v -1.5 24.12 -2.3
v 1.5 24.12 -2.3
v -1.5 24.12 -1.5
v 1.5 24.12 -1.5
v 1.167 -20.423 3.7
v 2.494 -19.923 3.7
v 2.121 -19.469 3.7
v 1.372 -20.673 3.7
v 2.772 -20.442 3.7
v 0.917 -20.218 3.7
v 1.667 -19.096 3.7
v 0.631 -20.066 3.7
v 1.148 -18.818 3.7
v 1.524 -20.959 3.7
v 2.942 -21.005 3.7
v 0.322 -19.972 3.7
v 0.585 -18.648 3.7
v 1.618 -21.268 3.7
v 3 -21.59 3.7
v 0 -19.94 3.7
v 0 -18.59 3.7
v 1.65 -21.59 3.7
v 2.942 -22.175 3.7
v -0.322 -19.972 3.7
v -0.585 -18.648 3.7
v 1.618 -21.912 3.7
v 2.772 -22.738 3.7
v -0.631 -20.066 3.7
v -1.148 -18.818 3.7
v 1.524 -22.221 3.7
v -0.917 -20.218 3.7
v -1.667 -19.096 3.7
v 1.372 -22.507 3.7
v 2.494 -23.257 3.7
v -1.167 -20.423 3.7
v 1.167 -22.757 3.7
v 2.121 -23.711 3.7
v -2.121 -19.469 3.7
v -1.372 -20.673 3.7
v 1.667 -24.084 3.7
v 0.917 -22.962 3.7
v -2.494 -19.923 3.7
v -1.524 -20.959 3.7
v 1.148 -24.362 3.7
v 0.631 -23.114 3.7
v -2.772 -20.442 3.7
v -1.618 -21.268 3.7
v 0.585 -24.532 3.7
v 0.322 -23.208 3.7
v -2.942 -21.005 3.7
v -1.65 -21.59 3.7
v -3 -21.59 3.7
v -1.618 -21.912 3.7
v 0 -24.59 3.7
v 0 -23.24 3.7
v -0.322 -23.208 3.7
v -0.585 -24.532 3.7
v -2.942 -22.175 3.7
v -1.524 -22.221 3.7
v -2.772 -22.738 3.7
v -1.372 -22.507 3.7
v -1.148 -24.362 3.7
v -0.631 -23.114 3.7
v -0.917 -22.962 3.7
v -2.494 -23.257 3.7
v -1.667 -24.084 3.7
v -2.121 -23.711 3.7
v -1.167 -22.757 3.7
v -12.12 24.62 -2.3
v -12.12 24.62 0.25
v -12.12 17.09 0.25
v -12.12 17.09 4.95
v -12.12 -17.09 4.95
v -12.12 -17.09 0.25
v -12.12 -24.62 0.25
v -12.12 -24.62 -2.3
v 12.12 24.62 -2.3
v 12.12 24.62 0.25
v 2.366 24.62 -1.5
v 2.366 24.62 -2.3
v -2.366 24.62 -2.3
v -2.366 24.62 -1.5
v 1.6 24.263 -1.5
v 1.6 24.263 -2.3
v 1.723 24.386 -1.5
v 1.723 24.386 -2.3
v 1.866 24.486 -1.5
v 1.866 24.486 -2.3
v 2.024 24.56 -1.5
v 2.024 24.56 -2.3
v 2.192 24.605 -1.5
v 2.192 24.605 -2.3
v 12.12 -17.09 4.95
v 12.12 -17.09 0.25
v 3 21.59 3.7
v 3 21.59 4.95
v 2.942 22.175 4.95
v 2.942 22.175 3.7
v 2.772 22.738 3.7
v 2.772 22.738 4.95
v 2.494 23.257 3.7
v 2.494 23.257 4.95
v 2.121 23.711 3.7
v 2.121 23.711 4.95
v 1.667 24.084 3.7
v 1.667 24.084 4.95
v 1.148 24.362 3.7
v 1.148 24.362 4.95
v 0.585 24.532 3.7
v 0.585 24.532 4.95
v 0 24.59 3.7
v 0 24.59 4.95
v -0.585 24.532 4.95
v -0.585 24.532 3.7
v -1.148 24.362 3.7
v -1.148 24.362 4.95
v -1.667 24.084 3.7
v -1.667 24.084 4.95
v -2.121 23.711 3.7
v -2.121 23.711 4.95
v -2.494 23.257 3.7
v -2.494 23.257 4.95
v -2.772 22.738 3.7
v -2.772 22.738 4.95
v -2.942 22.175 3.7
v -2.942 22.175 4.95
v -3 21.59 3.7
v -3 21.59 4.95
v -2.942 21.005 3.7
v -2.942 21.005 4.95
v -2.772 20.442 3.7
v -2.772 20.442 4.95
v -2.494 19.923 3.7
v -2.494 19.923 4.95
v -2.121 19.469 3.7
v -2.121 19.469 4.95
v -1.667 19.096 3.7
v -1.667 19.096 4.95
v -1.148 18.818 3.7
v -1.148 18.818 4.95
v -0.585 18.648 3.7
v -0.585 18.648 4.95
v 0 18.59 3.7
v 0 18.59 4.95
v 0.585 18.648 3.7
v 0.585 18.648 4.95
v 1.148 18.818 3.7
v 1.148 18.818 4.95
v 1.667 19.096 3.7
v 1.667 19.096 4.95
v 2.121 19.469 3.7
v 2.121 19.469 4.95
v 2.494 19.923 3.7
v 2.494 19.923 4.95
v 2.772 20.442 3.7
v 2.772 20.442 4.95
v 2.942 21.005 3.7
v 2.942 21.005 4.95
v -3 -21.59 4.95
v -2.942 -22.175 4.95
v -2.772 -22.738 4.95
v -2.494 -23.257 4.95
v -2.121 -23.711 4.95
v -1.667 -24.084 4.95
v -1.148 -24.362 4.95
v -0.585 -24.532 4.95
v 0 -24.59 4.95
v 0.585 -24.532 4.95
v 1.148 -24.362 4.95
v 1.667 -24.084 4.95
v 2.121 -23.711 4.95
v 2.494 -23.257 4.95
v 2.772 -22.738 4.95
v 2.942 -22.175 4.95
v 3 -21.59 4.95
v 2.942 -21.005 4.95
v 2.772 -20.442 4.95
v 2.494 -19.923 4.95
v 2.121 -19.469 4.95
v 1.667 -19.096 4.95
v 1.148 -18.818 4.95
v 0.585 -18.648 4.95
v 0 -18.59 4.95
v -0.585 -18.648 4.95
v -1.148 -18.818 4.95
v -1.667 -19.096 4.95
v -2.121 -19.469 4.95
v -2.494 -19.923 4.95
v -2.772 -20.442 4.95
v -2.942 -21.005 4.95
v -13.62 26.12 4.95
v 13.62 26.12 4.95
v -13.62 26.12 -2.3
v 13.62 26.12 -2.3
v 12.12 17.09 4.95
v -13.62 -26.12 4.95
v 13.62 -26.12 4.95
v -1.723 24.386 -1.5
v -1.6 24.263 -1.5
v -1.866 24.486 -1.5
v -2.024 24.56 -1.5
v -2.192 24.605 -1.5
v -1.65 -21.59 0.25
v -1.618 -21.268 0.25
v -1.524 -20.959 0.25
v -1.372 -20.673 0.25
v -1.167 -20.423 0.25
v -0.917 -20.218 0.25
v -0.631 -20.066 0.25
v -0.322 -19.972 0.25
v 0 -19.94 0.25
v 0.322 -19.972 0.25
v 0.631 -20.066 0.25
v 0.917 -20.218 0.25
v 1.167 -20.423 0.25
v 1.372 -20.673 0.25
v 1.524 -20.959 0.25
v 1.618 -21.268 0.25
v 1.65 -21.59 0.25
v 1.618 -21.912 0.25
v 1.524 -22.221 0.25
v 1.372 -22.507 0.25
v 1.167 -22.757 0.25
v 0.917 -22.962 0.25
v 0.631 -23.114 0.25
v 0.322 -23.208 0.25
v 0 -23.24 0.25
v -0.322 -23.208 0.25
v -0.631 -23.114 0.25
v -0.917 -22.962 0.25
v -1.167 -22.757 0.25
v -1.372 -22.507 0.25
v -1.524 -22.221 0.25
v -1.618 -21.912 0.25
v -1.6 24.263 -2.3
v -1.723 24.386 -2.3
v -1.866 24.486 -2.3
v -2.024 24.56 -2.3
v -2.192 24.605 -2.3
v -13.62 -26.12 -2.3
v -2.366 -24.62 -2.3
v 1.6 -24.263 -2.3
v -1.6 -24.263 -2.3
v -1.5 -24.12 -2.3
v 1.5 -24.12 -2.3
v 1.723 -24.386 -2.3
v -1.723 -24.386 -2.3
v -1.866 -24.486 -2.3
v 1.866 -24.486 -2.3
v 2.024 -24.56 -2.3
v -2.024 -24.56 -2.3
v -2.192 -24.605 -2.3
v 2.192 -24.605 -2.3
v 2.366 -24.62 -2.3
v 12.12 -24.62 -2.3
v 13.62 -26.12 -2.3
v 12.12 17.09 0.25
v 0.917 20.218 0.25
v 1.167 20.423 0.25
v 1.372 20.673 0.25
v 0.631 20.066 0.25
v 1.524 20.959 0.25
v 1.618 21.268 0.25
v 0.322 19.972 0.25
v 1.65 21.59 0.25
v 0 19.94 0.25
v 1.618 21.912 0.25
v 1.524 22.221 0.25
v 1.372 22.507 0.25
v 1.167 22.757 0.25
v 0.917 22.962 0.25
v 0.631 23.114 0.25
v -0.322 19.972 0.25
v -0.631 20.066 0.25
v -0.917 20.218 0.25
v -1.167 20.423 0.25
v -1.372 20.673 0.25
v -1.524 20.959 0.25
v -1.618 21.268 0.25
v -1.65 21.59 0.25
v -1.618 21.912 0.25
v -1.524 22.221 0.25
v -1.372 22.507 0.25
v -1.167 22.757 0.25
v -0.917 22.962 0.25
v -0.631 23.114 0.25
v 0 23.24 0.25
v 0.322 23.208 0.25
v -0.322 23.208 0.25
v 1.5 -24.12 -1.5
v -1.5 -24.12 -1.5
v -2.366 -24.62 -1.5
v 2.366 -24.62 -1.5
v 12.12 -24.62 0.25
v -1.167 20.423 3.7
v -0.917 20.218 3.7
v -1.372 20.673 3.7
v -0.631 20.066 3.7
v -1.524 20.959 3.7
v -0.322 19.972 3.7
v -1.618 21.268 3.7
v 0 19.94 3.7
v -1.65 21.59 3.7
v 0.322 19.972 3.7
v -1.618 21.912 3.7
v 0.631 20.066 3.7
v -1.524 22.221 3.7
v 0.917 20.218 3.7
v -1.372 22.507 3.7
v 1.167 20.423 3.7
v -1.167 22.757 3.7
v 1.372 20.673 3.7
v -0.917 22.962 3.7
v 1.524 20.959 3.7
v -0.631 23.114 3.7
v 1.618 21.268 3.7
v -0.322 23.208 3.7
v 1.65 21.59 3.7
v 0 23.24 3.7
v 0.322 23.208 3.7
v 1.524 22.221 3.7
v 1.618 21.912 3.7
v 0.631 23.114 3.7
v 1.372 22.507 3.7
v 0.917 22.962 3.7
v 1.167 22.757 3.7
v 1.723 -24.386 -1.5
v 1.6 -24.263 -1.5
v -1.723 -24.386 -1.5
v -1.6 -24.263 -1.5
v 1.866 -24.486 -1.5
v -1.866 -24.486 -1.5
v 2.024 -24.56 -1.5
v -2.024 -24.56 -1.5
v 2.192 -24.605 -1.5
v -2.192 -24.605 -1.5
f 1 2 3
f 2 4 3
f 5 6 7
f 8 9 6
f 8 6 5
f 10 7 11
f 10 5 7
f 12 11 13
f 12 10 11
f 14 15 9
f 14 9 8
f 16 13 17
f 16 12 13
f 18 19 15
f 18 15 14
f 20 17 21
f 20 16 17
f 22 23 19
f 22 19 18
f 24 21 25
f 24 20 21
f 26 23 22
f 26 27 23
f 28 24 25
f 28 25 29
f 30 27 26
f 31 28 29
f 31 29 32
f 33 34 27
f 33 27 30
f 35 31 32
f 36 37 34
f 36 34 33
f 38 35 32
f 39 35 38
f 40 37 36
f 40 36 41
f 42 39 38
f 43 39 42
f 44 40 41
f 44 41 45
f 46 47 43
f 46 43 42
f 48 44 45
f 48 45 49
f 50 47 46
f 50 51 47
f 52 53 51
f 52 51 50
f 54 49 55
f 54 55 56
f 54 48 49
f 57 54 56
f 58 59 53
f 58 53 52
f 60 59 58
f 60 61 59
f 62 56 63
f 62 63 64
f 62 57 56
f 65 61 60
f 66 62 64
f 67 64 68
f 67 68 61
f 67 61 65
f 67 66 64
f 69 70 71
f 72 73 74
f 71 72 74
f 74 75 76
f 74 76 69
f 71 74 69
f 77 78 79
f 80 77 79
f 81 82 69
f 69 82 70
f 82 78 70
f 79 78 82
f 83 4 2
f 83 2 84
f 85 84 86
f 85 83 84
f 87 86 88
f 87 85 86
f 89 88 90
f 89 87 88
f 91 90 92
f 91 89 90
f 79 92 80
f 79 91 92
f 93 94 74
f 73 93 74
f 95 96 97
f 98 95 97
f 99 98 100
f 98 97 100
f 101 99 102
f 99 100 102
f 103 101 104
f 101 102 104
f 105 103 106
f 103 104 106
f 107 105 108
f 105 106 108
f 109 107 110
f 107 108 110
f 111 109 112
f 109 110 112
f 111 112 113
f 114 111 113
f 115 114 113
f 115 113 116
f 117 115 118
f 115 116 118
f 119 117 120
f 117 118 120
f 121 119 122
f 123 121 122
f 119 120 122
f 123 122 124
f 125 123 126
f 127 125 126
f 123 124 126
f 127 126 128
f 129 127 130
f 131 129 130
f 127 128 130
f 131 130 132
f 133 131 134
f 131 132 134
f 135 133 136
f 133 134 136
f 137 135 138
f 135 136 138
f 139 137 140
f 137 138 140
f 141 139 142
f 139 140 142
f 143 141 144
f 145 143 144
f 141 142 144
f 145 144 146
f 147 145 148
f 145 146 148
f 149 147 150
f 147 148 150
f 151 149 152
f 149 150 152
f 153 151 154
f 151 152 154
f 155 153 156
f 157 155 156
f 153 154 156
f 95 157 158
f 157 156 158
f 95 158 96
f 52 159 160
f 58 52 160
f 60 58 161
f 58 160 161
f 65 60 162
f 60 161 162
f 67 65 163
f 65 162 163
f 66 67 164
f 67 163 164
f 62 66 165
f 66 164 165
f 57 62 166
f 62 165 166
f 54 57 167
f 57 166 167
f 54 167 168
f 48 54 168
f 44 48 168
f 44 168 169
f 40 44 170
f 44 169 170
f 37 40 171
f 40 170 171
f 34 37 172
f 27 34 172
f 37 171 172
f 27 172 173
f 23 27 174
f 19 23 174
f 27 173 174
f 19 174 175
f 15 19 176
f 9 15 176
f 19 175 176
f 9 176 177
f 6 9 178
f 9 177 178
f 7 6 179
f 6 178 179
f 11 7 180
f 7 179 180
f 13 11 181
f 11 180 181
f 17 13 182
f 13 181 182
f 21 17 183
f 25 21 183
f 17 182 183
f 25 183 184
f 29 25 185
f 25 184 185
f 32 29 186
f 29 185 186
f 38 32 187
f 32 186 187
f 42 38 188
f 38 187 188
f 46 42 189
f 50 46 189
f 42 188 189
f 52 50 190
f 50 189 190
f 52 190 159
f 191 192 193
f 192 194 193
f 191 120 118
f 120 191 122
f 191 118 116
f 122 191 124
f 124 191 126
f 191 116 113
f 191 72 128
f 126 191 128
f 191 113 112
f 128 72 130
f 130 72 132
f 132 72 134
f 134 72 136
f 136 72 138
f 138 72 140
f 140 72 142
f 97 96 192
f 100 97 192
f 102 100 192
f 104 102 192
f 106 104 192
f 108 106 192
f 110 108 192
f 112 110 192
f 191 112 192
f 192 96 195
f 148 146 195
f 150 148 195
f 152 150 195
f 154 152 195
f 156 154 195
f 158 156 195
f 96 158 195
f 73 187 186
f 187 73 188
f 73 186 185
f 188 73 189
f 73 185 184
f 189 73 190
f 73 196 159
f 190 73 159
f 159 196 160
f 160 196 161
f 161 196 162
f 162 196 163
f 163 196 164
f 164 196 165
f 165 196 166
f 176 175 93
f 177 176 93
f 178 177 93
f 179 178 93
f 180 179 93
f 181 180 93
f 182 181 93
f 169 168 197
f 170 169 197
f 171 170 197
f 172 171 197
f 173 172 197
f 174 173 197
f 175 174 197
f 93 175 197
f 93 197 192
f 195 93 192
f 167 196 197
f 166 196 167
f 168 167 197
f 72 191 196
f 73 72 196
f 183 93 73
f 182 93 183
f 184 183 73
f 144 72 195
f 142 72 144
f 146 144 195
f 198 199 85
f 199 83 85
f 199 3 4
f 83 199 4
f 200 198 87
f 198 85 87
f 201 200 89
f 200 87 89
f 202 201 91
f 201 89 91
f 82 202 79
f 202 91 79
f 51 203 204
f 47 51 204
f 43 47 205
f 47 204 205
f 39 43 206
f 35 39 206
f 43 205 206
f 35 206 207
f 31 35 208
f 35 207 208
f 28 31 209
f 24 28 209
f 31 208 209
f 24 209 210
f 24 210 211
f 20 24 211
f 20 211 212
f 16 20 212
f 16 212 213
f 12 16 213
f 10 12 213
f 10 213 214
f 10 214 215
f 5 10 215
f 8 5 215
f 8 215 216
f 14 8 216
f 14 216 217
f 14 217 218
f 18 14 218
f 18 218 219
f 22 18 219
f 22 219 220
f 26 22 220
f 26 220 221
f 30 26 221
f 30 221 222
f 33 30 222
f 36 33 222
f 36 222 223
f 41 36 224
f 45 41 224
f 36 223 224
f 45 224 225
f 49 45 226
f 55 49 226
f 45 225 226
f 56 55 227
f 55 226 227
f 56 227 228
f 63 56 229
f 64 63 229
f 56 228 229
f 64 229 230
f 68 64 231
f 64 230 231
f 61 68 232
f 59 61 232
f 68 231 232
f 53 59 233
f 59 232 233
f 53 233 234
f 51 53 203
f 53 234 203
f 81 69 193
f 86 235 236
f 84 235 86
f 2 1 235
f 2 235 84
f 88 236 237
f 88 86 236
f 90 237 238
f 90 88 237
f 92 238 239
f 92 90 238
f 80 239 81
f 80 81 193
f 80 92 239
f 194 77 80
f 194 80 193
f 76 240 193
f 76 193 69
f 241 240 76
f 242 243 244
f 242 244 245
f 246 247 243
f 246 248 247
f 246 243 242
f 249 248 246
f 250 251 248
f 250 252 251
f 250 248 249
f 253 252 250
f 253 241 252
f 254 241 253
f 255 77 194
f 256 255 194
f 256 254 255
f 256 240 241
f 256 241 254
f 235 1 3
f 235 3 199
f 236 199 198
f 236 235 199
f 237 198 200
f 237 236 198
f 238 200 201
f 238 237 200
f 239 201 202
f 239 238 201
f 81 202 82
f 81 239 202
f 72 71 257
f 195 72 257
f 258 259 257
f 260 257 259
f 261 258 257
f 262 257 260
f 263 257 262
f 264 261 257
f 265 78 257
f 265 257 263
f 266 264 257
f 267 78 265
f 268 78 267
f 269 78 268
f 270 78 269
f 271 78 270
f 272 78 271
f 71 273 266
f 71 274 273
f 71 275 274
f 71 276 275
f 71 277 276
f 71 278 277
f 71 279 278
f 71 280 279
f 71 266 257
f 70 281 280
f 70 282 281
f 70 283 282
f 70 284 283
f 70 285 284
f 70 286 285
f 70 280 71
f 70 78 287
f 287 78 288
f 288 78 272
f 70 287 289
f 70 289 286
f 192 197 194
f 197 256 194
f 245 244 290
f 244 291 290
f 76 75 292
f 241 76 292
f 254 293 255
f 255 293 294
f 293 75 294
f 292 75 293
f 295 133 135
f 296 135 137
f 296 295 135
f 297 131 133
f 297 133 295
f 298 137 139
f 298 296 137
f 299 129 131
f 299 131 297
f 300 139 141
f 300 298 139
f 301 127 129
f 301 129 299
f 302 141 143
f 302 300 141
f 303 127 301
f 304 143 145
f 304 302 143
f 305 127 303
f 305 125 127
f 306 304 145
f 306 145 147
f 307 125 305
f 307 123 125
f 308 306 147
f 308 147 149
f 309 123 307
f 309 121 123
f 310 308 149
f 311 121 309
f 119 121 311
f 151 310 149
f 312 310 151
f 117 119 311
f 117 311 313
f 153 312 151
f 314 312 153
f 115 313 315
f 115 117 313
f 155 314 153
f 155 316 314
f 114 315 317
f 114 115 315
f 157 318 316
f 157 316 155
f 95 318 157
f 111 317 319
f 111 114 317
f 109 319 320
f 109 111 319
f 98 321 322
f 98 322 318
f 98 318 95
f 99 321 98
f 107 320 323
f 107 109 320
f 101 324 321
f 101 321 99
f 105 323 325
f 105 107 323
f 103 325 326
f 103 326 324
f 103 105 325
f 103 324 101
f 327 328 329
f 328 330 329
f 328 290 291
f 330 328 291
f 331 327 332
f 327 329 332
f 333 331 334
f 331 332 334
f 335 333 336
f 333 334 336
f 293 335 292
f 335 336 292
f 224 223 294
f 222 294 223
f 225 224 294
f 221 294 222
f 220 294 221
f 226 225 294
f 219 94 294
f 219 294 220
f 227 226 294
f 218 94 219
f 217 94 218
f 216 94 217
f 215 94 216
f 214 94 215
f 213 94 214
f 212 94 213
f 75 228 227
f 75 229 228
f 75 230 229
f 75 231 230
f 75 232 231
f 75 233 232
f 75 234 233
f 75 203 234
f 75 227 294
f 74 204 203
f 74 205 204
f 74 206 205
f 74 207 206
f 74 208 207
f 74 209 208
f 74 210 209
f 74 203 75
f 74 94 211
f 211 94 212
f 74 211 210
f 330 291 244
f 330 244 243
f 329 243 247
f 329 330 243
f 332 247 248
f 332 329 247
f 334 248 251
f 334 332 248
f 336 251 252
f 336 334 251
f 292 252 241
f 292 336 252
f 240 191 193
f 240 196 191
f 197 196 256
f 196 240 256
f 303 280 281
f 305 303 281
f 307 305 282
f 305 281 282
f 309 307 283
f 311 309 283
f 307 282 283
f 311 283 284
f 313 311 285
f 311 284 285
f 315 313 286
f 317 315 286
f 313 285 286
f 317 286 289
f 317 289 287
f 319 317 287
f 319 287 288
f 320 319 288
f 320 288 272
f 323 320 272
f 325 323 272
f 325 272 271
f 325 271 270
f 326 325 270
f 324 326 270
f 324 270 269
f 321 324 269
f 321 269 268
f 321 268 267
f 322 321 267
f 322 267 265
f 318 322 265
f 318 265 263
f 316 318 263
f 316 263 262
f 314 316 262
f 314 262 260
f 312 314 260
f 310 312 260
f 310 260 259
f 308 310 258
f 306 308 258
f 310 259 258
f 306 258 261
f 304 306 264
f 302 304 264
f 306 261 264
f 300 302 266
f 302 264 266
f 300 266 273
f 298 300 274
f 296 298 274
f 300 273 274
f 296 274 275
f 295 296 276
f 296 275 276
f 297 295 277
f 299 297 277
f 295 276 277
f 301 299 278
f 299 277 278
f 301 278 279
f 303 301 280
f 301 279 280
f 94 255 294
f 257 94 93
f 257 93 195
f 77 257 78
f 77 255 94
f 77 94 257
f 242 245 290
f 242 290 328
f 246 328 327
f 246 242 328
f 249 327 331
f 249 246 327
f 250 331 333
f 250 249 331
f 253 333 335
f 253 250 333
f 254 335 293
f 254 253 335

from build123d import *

# Parameters (mm, degrees)
BOSS_EXTRUDE1_DEPTH      = 0.25
BOSS_EXTRUDE1_DEPTH_BACK = 1.7
SKETCH1_W                = 27.24
SKETCH1_H                = 52.24
SKETCH1_W_2              = 24.24
SKETCH1_H_2              = 49.24
SKETCH2_W                = 27.24
SKETCH2_H                = 52.24
SKETCH2_W_2              = 24.24
SKETCH2_H_2              = 34.18
BOSS_EXTRUDE2_DEPTH      = 1
SKETCH3_W                = 3
SKETCH3_H                = 34.18
BOSS_EXTRUDE3_DEPTH      = 1
SKETCH4_W                = 6
SKETCH4_H                = 34.18
CUT_EXTRUDE1_DEPTH       = 2.95
SKETCH5_W                = 3
SKETCH5_H                = 0.2
BOSS_EXTRUDE4_DEPTH      = 0.5
BOSS_EXTRUDE5_DEPTH      = 0.6
FILLET1_R                = 1
SKETCH8_W                = 16.74
SKETCH8_H                = 34.18
BOSS_EXTRUDE6_DEPTH      = 3.7
SKETCH7_R                = 1.65
CUT_EXTRUDE2_DEPTH       = 4.7
SKETCH10_R               = 3
CUT_EXTRUDE3_DEPTH       = 1.25
SKETCH12_W               = 6.25
SKETCH12_H               = 34.18
SKETCH12_W_2             = 7.24
BOSS_EXTRUDE7_DEPTH      = 4.7
SKETCH18_W               = 7.24
SKETCH18_H               = 34.18
CUT_EXTRUDE6_DEPTH       = 4.7
SKETCH19_W               = 1.5
SKETCH19_H               = 7.25
BOSS_EXTRUDE8_DEPTH      = 34.18
SKETCH20_W               = 6.25
SKETCH20_H               = 34.18
CUT_EXTRUDE7_DEPTH       = 4.7


with BuildPart() as part:
    # Sketch1 → Boss-Extrude1 (new, two sides: drawn at the far end of the back side and taken through both)
    with BuildSketch(Plane.XY.offset(-BOSS_EXTRUDE1_DEPTH_BACK)):
        Rectangle(SKETCH1_W, SKETCH1_H)
        Rectangle(SKETCH1_W_2, SKETCH1_H_2, mode=Mode.SUBTRACT)
    extrude(amount=BOSS_EXTRUDE1_DEPTH + BOSS_EXTRUDE1_DEPTH_BACK)

    # Sketch2 → Boss-Extrude2 (add)
    with BuildSketch(Plane.XY.offset(0.25)):
        Rectangle(SKETCH2_W, SKETCH2_H)
        Rectangle(SKETCH2_W_2, SKETCH2_H_2, mode=Mode.SUBTRACT)
    extrude(amount=BOSS_EXTRUDE2_DEPTH)

    # Sketch3 → Boss-Extrude3 (add)
    with BuildSketch(Plane.XY.offset(1.25)):
        with Locations((-6.12, 0)):
            Rectangle(SKETCH3_W, SKETCH3_H)
    extrude(amount=-BOSS_EXTRUDE3_DEPTH)

    # Sketch4 → Cut-Extrude1 (cut)
    with BuildSketch(Plane.XY.offset(1.25)):
        with Locations((-10.62, 0)):
            Rectangle(SKETCH4_W, SKETCH4_H)
    extrude(amount=-CUT_EXTRUDE1_DEPTH, mode=Mode.SUBTRACT)

    # Sketch5 → Boss-Extrude4 (add)
    with BuildSketch(Plane.XZ.offset(-24.62)):
        with Locations((0, -1.6)):
            Rectangle(SKETCH5_W, SKETCH5_H)
    boss_extrude4 = extrude(amount=BOSS_EXTRUDE4_DEPTH)

    # Mirror1: Boss-Extrude4 across plane
    add(boss_extrude4.mirror(Plane.ZX))

    # Sketch6 → Boss-Extrude5 (add)
    with BuildSketch(Plane(origin=(0, 0, -1.7), x_dir=(-1, 0, 0), z_dir=(0, 0, -1))):
        Polygon((13.62, -26.12), (13.62, -17.09), (12.12, -17.09), (12.12, -24.62), (1.5, -24.62), (1.5, -24.12), (-1.5, -24.12), (-1.5, -24.62), (-12.12, -24.62), (-12.12, 24.62), (-1.5, 24.62), (-1.5, 24.12), (1.5, 24.12), (1.5, 24.62), (12.12, 24.62), (12.12, 17.09), (13.62, 17.09), (13.62, 26.12), (-13.62, 26.12), (-13.62, -26.12), align=None)
    extrude(amount=BOSS_EXTRUDE5_DEPTH)

    # Fillet1
    # the kernel refuses this fillet: 1 mm, written as the material it adds along each edge
    with BuildSketch(Plane(origin=(1.5, -24.62, -2.3), x_dir=(1, 0, 0), z_dir=(0, 0, 1)), Plane(origin=(-1.5, -24.62, -1.5), x_dir=(-1, 0, 0), z_dir=(0, 0, -1)), Plane(origin=(1.5, 24.62, -1.5), x_dir=(1, 0, 0), z_dir=(0, 0, -1)), Plane(origin=(-1.5, 24.62, -2.3), x_dir=(-1, 0, 0), z_dir=(0, 0, 1))) as fillet1_piece_1:
        with BuildLine():
            CenterArc((0.866025404, 1), FILLET1_R, 210, 60)
            Line((0, 0.5), (-0.017320508, 0.49))
            ThreePointArc((-0.017320508, 0.49), (-0.02, 0.25), (-0.02, 0))
            Line((-0.02, 0), (0, -0.02))
            Line((0, -0.02), (0.866025404, -0.02))
            Line((0.866025404, -0.02), (0.866025404, 0))
        make_face()
    extrude(amount=0.8)

    # Sketch8 → Boss-Extrude6 (add)
    with BuildSketch(Plane.XY.offset(1.25)):
        Polygon((-7.62, -17.09), (-13.62, -17.09), (-13.62, -26.12), (13.62, -26.12), (13.62, 26.12), (-13.62, 26.12), (-13.62, 17.09), (-7.62, 17.09), align=None)
        with Locations((3.75, 0)):
            Rectangle(SKETCH8_W, SKETCH8_H, mode=Mode.SUBTRACT)
    extrude(amount=BOSS_EXTRUDE6_DEPTH)

    # Sketch7 → Cut-Extrude2 (cut)
    with BuildSketch(Plane(origin=(0, 0, 0.25), x_dir=(-1, 0, 0), z_dir=(0, 0, -1))):
        with Locations((0, 21.59)):
            Circle(SKETCH7_R)
        with Locations((0, -21.59)):
            Circle(SKETCH7_R)
    extrude(amount=-CUT_EXTRUDE2_DEPTH, mode=Mode.SUBTRACT)

    # Sketch10 → Cut-Extrude3 (cut)
    with BuildSketch(Plane.XY.offset(4.95)):
        with Locations((0, 21.59)):
            Circle(SKETCH10_R)
        with Locations(Location((0, -21.59, 0), (0, 0, 180))):
            Circle(SKETCH10_R)
    extrude(amount=-CUT_EXTRUDE3_DEPTH, mode=Mode.SUBTRACT)

    # Sketch12 → Boss-Extrude7 (add)
    with BuildSketch(Plane(origin=(0, 0, 0.25), x_dir=(-1, 0, 0), z_dir=(0, 0, -1))):
        with Locations((-8.995, 0)):
            Rectangle(SKETCH12_W, SKETCH12_H)
        with Locations((6.25, 0)):
            Rectangle(SKETCH12_W_2, SKETCH12_H)
    extrude(amount=-BOSS_EXTRUDE7_DEPTH)

    # Sketch18 → Cut-Extrude6 (cut)
    with BuildSketch(Plane(origin=(0, 0, 0.25), x_dir=(-1, 0, 0), z_dir=(0, 0, -1))):
        with Locations((6.25, 0)):
            Rectangle(SKETCH18_W, SKETCH18_H)
    extrude(amount=-CUT_EXTRUDE6_DEPTH, mode=Mode.SUBTRACT)

    # Sketch19 → Boss-Extrude8 (add)
    with BuildSketch(Plane(origin=(0, -17.09, 0), x_dir=(1, 0, 0), z_dir=(0, 1, 0))):
        with Locations((-12.87, -1.325)):
            Rectangle(SKETCH19_W, SKETCH19_H)
    extrude(amount=BOSS_EXTRUDE8_DEPTH)

    # Sketch20 → Cut-Extrude7 (cut)
    with BuildSketch(Plane(origin=(0, 0, 0.25), x_dir=(-1, 0, 0), z_dir=(0, 0, -1))):
        with Locations((-8.995, 0)):
            Rectangle(SKETCH20_W, SKETCH20_H)
    extrude(amount=-CUT_EXTRUDE7_DEPTH, mode=Mode.SUBTRACT)


solid = part.part
